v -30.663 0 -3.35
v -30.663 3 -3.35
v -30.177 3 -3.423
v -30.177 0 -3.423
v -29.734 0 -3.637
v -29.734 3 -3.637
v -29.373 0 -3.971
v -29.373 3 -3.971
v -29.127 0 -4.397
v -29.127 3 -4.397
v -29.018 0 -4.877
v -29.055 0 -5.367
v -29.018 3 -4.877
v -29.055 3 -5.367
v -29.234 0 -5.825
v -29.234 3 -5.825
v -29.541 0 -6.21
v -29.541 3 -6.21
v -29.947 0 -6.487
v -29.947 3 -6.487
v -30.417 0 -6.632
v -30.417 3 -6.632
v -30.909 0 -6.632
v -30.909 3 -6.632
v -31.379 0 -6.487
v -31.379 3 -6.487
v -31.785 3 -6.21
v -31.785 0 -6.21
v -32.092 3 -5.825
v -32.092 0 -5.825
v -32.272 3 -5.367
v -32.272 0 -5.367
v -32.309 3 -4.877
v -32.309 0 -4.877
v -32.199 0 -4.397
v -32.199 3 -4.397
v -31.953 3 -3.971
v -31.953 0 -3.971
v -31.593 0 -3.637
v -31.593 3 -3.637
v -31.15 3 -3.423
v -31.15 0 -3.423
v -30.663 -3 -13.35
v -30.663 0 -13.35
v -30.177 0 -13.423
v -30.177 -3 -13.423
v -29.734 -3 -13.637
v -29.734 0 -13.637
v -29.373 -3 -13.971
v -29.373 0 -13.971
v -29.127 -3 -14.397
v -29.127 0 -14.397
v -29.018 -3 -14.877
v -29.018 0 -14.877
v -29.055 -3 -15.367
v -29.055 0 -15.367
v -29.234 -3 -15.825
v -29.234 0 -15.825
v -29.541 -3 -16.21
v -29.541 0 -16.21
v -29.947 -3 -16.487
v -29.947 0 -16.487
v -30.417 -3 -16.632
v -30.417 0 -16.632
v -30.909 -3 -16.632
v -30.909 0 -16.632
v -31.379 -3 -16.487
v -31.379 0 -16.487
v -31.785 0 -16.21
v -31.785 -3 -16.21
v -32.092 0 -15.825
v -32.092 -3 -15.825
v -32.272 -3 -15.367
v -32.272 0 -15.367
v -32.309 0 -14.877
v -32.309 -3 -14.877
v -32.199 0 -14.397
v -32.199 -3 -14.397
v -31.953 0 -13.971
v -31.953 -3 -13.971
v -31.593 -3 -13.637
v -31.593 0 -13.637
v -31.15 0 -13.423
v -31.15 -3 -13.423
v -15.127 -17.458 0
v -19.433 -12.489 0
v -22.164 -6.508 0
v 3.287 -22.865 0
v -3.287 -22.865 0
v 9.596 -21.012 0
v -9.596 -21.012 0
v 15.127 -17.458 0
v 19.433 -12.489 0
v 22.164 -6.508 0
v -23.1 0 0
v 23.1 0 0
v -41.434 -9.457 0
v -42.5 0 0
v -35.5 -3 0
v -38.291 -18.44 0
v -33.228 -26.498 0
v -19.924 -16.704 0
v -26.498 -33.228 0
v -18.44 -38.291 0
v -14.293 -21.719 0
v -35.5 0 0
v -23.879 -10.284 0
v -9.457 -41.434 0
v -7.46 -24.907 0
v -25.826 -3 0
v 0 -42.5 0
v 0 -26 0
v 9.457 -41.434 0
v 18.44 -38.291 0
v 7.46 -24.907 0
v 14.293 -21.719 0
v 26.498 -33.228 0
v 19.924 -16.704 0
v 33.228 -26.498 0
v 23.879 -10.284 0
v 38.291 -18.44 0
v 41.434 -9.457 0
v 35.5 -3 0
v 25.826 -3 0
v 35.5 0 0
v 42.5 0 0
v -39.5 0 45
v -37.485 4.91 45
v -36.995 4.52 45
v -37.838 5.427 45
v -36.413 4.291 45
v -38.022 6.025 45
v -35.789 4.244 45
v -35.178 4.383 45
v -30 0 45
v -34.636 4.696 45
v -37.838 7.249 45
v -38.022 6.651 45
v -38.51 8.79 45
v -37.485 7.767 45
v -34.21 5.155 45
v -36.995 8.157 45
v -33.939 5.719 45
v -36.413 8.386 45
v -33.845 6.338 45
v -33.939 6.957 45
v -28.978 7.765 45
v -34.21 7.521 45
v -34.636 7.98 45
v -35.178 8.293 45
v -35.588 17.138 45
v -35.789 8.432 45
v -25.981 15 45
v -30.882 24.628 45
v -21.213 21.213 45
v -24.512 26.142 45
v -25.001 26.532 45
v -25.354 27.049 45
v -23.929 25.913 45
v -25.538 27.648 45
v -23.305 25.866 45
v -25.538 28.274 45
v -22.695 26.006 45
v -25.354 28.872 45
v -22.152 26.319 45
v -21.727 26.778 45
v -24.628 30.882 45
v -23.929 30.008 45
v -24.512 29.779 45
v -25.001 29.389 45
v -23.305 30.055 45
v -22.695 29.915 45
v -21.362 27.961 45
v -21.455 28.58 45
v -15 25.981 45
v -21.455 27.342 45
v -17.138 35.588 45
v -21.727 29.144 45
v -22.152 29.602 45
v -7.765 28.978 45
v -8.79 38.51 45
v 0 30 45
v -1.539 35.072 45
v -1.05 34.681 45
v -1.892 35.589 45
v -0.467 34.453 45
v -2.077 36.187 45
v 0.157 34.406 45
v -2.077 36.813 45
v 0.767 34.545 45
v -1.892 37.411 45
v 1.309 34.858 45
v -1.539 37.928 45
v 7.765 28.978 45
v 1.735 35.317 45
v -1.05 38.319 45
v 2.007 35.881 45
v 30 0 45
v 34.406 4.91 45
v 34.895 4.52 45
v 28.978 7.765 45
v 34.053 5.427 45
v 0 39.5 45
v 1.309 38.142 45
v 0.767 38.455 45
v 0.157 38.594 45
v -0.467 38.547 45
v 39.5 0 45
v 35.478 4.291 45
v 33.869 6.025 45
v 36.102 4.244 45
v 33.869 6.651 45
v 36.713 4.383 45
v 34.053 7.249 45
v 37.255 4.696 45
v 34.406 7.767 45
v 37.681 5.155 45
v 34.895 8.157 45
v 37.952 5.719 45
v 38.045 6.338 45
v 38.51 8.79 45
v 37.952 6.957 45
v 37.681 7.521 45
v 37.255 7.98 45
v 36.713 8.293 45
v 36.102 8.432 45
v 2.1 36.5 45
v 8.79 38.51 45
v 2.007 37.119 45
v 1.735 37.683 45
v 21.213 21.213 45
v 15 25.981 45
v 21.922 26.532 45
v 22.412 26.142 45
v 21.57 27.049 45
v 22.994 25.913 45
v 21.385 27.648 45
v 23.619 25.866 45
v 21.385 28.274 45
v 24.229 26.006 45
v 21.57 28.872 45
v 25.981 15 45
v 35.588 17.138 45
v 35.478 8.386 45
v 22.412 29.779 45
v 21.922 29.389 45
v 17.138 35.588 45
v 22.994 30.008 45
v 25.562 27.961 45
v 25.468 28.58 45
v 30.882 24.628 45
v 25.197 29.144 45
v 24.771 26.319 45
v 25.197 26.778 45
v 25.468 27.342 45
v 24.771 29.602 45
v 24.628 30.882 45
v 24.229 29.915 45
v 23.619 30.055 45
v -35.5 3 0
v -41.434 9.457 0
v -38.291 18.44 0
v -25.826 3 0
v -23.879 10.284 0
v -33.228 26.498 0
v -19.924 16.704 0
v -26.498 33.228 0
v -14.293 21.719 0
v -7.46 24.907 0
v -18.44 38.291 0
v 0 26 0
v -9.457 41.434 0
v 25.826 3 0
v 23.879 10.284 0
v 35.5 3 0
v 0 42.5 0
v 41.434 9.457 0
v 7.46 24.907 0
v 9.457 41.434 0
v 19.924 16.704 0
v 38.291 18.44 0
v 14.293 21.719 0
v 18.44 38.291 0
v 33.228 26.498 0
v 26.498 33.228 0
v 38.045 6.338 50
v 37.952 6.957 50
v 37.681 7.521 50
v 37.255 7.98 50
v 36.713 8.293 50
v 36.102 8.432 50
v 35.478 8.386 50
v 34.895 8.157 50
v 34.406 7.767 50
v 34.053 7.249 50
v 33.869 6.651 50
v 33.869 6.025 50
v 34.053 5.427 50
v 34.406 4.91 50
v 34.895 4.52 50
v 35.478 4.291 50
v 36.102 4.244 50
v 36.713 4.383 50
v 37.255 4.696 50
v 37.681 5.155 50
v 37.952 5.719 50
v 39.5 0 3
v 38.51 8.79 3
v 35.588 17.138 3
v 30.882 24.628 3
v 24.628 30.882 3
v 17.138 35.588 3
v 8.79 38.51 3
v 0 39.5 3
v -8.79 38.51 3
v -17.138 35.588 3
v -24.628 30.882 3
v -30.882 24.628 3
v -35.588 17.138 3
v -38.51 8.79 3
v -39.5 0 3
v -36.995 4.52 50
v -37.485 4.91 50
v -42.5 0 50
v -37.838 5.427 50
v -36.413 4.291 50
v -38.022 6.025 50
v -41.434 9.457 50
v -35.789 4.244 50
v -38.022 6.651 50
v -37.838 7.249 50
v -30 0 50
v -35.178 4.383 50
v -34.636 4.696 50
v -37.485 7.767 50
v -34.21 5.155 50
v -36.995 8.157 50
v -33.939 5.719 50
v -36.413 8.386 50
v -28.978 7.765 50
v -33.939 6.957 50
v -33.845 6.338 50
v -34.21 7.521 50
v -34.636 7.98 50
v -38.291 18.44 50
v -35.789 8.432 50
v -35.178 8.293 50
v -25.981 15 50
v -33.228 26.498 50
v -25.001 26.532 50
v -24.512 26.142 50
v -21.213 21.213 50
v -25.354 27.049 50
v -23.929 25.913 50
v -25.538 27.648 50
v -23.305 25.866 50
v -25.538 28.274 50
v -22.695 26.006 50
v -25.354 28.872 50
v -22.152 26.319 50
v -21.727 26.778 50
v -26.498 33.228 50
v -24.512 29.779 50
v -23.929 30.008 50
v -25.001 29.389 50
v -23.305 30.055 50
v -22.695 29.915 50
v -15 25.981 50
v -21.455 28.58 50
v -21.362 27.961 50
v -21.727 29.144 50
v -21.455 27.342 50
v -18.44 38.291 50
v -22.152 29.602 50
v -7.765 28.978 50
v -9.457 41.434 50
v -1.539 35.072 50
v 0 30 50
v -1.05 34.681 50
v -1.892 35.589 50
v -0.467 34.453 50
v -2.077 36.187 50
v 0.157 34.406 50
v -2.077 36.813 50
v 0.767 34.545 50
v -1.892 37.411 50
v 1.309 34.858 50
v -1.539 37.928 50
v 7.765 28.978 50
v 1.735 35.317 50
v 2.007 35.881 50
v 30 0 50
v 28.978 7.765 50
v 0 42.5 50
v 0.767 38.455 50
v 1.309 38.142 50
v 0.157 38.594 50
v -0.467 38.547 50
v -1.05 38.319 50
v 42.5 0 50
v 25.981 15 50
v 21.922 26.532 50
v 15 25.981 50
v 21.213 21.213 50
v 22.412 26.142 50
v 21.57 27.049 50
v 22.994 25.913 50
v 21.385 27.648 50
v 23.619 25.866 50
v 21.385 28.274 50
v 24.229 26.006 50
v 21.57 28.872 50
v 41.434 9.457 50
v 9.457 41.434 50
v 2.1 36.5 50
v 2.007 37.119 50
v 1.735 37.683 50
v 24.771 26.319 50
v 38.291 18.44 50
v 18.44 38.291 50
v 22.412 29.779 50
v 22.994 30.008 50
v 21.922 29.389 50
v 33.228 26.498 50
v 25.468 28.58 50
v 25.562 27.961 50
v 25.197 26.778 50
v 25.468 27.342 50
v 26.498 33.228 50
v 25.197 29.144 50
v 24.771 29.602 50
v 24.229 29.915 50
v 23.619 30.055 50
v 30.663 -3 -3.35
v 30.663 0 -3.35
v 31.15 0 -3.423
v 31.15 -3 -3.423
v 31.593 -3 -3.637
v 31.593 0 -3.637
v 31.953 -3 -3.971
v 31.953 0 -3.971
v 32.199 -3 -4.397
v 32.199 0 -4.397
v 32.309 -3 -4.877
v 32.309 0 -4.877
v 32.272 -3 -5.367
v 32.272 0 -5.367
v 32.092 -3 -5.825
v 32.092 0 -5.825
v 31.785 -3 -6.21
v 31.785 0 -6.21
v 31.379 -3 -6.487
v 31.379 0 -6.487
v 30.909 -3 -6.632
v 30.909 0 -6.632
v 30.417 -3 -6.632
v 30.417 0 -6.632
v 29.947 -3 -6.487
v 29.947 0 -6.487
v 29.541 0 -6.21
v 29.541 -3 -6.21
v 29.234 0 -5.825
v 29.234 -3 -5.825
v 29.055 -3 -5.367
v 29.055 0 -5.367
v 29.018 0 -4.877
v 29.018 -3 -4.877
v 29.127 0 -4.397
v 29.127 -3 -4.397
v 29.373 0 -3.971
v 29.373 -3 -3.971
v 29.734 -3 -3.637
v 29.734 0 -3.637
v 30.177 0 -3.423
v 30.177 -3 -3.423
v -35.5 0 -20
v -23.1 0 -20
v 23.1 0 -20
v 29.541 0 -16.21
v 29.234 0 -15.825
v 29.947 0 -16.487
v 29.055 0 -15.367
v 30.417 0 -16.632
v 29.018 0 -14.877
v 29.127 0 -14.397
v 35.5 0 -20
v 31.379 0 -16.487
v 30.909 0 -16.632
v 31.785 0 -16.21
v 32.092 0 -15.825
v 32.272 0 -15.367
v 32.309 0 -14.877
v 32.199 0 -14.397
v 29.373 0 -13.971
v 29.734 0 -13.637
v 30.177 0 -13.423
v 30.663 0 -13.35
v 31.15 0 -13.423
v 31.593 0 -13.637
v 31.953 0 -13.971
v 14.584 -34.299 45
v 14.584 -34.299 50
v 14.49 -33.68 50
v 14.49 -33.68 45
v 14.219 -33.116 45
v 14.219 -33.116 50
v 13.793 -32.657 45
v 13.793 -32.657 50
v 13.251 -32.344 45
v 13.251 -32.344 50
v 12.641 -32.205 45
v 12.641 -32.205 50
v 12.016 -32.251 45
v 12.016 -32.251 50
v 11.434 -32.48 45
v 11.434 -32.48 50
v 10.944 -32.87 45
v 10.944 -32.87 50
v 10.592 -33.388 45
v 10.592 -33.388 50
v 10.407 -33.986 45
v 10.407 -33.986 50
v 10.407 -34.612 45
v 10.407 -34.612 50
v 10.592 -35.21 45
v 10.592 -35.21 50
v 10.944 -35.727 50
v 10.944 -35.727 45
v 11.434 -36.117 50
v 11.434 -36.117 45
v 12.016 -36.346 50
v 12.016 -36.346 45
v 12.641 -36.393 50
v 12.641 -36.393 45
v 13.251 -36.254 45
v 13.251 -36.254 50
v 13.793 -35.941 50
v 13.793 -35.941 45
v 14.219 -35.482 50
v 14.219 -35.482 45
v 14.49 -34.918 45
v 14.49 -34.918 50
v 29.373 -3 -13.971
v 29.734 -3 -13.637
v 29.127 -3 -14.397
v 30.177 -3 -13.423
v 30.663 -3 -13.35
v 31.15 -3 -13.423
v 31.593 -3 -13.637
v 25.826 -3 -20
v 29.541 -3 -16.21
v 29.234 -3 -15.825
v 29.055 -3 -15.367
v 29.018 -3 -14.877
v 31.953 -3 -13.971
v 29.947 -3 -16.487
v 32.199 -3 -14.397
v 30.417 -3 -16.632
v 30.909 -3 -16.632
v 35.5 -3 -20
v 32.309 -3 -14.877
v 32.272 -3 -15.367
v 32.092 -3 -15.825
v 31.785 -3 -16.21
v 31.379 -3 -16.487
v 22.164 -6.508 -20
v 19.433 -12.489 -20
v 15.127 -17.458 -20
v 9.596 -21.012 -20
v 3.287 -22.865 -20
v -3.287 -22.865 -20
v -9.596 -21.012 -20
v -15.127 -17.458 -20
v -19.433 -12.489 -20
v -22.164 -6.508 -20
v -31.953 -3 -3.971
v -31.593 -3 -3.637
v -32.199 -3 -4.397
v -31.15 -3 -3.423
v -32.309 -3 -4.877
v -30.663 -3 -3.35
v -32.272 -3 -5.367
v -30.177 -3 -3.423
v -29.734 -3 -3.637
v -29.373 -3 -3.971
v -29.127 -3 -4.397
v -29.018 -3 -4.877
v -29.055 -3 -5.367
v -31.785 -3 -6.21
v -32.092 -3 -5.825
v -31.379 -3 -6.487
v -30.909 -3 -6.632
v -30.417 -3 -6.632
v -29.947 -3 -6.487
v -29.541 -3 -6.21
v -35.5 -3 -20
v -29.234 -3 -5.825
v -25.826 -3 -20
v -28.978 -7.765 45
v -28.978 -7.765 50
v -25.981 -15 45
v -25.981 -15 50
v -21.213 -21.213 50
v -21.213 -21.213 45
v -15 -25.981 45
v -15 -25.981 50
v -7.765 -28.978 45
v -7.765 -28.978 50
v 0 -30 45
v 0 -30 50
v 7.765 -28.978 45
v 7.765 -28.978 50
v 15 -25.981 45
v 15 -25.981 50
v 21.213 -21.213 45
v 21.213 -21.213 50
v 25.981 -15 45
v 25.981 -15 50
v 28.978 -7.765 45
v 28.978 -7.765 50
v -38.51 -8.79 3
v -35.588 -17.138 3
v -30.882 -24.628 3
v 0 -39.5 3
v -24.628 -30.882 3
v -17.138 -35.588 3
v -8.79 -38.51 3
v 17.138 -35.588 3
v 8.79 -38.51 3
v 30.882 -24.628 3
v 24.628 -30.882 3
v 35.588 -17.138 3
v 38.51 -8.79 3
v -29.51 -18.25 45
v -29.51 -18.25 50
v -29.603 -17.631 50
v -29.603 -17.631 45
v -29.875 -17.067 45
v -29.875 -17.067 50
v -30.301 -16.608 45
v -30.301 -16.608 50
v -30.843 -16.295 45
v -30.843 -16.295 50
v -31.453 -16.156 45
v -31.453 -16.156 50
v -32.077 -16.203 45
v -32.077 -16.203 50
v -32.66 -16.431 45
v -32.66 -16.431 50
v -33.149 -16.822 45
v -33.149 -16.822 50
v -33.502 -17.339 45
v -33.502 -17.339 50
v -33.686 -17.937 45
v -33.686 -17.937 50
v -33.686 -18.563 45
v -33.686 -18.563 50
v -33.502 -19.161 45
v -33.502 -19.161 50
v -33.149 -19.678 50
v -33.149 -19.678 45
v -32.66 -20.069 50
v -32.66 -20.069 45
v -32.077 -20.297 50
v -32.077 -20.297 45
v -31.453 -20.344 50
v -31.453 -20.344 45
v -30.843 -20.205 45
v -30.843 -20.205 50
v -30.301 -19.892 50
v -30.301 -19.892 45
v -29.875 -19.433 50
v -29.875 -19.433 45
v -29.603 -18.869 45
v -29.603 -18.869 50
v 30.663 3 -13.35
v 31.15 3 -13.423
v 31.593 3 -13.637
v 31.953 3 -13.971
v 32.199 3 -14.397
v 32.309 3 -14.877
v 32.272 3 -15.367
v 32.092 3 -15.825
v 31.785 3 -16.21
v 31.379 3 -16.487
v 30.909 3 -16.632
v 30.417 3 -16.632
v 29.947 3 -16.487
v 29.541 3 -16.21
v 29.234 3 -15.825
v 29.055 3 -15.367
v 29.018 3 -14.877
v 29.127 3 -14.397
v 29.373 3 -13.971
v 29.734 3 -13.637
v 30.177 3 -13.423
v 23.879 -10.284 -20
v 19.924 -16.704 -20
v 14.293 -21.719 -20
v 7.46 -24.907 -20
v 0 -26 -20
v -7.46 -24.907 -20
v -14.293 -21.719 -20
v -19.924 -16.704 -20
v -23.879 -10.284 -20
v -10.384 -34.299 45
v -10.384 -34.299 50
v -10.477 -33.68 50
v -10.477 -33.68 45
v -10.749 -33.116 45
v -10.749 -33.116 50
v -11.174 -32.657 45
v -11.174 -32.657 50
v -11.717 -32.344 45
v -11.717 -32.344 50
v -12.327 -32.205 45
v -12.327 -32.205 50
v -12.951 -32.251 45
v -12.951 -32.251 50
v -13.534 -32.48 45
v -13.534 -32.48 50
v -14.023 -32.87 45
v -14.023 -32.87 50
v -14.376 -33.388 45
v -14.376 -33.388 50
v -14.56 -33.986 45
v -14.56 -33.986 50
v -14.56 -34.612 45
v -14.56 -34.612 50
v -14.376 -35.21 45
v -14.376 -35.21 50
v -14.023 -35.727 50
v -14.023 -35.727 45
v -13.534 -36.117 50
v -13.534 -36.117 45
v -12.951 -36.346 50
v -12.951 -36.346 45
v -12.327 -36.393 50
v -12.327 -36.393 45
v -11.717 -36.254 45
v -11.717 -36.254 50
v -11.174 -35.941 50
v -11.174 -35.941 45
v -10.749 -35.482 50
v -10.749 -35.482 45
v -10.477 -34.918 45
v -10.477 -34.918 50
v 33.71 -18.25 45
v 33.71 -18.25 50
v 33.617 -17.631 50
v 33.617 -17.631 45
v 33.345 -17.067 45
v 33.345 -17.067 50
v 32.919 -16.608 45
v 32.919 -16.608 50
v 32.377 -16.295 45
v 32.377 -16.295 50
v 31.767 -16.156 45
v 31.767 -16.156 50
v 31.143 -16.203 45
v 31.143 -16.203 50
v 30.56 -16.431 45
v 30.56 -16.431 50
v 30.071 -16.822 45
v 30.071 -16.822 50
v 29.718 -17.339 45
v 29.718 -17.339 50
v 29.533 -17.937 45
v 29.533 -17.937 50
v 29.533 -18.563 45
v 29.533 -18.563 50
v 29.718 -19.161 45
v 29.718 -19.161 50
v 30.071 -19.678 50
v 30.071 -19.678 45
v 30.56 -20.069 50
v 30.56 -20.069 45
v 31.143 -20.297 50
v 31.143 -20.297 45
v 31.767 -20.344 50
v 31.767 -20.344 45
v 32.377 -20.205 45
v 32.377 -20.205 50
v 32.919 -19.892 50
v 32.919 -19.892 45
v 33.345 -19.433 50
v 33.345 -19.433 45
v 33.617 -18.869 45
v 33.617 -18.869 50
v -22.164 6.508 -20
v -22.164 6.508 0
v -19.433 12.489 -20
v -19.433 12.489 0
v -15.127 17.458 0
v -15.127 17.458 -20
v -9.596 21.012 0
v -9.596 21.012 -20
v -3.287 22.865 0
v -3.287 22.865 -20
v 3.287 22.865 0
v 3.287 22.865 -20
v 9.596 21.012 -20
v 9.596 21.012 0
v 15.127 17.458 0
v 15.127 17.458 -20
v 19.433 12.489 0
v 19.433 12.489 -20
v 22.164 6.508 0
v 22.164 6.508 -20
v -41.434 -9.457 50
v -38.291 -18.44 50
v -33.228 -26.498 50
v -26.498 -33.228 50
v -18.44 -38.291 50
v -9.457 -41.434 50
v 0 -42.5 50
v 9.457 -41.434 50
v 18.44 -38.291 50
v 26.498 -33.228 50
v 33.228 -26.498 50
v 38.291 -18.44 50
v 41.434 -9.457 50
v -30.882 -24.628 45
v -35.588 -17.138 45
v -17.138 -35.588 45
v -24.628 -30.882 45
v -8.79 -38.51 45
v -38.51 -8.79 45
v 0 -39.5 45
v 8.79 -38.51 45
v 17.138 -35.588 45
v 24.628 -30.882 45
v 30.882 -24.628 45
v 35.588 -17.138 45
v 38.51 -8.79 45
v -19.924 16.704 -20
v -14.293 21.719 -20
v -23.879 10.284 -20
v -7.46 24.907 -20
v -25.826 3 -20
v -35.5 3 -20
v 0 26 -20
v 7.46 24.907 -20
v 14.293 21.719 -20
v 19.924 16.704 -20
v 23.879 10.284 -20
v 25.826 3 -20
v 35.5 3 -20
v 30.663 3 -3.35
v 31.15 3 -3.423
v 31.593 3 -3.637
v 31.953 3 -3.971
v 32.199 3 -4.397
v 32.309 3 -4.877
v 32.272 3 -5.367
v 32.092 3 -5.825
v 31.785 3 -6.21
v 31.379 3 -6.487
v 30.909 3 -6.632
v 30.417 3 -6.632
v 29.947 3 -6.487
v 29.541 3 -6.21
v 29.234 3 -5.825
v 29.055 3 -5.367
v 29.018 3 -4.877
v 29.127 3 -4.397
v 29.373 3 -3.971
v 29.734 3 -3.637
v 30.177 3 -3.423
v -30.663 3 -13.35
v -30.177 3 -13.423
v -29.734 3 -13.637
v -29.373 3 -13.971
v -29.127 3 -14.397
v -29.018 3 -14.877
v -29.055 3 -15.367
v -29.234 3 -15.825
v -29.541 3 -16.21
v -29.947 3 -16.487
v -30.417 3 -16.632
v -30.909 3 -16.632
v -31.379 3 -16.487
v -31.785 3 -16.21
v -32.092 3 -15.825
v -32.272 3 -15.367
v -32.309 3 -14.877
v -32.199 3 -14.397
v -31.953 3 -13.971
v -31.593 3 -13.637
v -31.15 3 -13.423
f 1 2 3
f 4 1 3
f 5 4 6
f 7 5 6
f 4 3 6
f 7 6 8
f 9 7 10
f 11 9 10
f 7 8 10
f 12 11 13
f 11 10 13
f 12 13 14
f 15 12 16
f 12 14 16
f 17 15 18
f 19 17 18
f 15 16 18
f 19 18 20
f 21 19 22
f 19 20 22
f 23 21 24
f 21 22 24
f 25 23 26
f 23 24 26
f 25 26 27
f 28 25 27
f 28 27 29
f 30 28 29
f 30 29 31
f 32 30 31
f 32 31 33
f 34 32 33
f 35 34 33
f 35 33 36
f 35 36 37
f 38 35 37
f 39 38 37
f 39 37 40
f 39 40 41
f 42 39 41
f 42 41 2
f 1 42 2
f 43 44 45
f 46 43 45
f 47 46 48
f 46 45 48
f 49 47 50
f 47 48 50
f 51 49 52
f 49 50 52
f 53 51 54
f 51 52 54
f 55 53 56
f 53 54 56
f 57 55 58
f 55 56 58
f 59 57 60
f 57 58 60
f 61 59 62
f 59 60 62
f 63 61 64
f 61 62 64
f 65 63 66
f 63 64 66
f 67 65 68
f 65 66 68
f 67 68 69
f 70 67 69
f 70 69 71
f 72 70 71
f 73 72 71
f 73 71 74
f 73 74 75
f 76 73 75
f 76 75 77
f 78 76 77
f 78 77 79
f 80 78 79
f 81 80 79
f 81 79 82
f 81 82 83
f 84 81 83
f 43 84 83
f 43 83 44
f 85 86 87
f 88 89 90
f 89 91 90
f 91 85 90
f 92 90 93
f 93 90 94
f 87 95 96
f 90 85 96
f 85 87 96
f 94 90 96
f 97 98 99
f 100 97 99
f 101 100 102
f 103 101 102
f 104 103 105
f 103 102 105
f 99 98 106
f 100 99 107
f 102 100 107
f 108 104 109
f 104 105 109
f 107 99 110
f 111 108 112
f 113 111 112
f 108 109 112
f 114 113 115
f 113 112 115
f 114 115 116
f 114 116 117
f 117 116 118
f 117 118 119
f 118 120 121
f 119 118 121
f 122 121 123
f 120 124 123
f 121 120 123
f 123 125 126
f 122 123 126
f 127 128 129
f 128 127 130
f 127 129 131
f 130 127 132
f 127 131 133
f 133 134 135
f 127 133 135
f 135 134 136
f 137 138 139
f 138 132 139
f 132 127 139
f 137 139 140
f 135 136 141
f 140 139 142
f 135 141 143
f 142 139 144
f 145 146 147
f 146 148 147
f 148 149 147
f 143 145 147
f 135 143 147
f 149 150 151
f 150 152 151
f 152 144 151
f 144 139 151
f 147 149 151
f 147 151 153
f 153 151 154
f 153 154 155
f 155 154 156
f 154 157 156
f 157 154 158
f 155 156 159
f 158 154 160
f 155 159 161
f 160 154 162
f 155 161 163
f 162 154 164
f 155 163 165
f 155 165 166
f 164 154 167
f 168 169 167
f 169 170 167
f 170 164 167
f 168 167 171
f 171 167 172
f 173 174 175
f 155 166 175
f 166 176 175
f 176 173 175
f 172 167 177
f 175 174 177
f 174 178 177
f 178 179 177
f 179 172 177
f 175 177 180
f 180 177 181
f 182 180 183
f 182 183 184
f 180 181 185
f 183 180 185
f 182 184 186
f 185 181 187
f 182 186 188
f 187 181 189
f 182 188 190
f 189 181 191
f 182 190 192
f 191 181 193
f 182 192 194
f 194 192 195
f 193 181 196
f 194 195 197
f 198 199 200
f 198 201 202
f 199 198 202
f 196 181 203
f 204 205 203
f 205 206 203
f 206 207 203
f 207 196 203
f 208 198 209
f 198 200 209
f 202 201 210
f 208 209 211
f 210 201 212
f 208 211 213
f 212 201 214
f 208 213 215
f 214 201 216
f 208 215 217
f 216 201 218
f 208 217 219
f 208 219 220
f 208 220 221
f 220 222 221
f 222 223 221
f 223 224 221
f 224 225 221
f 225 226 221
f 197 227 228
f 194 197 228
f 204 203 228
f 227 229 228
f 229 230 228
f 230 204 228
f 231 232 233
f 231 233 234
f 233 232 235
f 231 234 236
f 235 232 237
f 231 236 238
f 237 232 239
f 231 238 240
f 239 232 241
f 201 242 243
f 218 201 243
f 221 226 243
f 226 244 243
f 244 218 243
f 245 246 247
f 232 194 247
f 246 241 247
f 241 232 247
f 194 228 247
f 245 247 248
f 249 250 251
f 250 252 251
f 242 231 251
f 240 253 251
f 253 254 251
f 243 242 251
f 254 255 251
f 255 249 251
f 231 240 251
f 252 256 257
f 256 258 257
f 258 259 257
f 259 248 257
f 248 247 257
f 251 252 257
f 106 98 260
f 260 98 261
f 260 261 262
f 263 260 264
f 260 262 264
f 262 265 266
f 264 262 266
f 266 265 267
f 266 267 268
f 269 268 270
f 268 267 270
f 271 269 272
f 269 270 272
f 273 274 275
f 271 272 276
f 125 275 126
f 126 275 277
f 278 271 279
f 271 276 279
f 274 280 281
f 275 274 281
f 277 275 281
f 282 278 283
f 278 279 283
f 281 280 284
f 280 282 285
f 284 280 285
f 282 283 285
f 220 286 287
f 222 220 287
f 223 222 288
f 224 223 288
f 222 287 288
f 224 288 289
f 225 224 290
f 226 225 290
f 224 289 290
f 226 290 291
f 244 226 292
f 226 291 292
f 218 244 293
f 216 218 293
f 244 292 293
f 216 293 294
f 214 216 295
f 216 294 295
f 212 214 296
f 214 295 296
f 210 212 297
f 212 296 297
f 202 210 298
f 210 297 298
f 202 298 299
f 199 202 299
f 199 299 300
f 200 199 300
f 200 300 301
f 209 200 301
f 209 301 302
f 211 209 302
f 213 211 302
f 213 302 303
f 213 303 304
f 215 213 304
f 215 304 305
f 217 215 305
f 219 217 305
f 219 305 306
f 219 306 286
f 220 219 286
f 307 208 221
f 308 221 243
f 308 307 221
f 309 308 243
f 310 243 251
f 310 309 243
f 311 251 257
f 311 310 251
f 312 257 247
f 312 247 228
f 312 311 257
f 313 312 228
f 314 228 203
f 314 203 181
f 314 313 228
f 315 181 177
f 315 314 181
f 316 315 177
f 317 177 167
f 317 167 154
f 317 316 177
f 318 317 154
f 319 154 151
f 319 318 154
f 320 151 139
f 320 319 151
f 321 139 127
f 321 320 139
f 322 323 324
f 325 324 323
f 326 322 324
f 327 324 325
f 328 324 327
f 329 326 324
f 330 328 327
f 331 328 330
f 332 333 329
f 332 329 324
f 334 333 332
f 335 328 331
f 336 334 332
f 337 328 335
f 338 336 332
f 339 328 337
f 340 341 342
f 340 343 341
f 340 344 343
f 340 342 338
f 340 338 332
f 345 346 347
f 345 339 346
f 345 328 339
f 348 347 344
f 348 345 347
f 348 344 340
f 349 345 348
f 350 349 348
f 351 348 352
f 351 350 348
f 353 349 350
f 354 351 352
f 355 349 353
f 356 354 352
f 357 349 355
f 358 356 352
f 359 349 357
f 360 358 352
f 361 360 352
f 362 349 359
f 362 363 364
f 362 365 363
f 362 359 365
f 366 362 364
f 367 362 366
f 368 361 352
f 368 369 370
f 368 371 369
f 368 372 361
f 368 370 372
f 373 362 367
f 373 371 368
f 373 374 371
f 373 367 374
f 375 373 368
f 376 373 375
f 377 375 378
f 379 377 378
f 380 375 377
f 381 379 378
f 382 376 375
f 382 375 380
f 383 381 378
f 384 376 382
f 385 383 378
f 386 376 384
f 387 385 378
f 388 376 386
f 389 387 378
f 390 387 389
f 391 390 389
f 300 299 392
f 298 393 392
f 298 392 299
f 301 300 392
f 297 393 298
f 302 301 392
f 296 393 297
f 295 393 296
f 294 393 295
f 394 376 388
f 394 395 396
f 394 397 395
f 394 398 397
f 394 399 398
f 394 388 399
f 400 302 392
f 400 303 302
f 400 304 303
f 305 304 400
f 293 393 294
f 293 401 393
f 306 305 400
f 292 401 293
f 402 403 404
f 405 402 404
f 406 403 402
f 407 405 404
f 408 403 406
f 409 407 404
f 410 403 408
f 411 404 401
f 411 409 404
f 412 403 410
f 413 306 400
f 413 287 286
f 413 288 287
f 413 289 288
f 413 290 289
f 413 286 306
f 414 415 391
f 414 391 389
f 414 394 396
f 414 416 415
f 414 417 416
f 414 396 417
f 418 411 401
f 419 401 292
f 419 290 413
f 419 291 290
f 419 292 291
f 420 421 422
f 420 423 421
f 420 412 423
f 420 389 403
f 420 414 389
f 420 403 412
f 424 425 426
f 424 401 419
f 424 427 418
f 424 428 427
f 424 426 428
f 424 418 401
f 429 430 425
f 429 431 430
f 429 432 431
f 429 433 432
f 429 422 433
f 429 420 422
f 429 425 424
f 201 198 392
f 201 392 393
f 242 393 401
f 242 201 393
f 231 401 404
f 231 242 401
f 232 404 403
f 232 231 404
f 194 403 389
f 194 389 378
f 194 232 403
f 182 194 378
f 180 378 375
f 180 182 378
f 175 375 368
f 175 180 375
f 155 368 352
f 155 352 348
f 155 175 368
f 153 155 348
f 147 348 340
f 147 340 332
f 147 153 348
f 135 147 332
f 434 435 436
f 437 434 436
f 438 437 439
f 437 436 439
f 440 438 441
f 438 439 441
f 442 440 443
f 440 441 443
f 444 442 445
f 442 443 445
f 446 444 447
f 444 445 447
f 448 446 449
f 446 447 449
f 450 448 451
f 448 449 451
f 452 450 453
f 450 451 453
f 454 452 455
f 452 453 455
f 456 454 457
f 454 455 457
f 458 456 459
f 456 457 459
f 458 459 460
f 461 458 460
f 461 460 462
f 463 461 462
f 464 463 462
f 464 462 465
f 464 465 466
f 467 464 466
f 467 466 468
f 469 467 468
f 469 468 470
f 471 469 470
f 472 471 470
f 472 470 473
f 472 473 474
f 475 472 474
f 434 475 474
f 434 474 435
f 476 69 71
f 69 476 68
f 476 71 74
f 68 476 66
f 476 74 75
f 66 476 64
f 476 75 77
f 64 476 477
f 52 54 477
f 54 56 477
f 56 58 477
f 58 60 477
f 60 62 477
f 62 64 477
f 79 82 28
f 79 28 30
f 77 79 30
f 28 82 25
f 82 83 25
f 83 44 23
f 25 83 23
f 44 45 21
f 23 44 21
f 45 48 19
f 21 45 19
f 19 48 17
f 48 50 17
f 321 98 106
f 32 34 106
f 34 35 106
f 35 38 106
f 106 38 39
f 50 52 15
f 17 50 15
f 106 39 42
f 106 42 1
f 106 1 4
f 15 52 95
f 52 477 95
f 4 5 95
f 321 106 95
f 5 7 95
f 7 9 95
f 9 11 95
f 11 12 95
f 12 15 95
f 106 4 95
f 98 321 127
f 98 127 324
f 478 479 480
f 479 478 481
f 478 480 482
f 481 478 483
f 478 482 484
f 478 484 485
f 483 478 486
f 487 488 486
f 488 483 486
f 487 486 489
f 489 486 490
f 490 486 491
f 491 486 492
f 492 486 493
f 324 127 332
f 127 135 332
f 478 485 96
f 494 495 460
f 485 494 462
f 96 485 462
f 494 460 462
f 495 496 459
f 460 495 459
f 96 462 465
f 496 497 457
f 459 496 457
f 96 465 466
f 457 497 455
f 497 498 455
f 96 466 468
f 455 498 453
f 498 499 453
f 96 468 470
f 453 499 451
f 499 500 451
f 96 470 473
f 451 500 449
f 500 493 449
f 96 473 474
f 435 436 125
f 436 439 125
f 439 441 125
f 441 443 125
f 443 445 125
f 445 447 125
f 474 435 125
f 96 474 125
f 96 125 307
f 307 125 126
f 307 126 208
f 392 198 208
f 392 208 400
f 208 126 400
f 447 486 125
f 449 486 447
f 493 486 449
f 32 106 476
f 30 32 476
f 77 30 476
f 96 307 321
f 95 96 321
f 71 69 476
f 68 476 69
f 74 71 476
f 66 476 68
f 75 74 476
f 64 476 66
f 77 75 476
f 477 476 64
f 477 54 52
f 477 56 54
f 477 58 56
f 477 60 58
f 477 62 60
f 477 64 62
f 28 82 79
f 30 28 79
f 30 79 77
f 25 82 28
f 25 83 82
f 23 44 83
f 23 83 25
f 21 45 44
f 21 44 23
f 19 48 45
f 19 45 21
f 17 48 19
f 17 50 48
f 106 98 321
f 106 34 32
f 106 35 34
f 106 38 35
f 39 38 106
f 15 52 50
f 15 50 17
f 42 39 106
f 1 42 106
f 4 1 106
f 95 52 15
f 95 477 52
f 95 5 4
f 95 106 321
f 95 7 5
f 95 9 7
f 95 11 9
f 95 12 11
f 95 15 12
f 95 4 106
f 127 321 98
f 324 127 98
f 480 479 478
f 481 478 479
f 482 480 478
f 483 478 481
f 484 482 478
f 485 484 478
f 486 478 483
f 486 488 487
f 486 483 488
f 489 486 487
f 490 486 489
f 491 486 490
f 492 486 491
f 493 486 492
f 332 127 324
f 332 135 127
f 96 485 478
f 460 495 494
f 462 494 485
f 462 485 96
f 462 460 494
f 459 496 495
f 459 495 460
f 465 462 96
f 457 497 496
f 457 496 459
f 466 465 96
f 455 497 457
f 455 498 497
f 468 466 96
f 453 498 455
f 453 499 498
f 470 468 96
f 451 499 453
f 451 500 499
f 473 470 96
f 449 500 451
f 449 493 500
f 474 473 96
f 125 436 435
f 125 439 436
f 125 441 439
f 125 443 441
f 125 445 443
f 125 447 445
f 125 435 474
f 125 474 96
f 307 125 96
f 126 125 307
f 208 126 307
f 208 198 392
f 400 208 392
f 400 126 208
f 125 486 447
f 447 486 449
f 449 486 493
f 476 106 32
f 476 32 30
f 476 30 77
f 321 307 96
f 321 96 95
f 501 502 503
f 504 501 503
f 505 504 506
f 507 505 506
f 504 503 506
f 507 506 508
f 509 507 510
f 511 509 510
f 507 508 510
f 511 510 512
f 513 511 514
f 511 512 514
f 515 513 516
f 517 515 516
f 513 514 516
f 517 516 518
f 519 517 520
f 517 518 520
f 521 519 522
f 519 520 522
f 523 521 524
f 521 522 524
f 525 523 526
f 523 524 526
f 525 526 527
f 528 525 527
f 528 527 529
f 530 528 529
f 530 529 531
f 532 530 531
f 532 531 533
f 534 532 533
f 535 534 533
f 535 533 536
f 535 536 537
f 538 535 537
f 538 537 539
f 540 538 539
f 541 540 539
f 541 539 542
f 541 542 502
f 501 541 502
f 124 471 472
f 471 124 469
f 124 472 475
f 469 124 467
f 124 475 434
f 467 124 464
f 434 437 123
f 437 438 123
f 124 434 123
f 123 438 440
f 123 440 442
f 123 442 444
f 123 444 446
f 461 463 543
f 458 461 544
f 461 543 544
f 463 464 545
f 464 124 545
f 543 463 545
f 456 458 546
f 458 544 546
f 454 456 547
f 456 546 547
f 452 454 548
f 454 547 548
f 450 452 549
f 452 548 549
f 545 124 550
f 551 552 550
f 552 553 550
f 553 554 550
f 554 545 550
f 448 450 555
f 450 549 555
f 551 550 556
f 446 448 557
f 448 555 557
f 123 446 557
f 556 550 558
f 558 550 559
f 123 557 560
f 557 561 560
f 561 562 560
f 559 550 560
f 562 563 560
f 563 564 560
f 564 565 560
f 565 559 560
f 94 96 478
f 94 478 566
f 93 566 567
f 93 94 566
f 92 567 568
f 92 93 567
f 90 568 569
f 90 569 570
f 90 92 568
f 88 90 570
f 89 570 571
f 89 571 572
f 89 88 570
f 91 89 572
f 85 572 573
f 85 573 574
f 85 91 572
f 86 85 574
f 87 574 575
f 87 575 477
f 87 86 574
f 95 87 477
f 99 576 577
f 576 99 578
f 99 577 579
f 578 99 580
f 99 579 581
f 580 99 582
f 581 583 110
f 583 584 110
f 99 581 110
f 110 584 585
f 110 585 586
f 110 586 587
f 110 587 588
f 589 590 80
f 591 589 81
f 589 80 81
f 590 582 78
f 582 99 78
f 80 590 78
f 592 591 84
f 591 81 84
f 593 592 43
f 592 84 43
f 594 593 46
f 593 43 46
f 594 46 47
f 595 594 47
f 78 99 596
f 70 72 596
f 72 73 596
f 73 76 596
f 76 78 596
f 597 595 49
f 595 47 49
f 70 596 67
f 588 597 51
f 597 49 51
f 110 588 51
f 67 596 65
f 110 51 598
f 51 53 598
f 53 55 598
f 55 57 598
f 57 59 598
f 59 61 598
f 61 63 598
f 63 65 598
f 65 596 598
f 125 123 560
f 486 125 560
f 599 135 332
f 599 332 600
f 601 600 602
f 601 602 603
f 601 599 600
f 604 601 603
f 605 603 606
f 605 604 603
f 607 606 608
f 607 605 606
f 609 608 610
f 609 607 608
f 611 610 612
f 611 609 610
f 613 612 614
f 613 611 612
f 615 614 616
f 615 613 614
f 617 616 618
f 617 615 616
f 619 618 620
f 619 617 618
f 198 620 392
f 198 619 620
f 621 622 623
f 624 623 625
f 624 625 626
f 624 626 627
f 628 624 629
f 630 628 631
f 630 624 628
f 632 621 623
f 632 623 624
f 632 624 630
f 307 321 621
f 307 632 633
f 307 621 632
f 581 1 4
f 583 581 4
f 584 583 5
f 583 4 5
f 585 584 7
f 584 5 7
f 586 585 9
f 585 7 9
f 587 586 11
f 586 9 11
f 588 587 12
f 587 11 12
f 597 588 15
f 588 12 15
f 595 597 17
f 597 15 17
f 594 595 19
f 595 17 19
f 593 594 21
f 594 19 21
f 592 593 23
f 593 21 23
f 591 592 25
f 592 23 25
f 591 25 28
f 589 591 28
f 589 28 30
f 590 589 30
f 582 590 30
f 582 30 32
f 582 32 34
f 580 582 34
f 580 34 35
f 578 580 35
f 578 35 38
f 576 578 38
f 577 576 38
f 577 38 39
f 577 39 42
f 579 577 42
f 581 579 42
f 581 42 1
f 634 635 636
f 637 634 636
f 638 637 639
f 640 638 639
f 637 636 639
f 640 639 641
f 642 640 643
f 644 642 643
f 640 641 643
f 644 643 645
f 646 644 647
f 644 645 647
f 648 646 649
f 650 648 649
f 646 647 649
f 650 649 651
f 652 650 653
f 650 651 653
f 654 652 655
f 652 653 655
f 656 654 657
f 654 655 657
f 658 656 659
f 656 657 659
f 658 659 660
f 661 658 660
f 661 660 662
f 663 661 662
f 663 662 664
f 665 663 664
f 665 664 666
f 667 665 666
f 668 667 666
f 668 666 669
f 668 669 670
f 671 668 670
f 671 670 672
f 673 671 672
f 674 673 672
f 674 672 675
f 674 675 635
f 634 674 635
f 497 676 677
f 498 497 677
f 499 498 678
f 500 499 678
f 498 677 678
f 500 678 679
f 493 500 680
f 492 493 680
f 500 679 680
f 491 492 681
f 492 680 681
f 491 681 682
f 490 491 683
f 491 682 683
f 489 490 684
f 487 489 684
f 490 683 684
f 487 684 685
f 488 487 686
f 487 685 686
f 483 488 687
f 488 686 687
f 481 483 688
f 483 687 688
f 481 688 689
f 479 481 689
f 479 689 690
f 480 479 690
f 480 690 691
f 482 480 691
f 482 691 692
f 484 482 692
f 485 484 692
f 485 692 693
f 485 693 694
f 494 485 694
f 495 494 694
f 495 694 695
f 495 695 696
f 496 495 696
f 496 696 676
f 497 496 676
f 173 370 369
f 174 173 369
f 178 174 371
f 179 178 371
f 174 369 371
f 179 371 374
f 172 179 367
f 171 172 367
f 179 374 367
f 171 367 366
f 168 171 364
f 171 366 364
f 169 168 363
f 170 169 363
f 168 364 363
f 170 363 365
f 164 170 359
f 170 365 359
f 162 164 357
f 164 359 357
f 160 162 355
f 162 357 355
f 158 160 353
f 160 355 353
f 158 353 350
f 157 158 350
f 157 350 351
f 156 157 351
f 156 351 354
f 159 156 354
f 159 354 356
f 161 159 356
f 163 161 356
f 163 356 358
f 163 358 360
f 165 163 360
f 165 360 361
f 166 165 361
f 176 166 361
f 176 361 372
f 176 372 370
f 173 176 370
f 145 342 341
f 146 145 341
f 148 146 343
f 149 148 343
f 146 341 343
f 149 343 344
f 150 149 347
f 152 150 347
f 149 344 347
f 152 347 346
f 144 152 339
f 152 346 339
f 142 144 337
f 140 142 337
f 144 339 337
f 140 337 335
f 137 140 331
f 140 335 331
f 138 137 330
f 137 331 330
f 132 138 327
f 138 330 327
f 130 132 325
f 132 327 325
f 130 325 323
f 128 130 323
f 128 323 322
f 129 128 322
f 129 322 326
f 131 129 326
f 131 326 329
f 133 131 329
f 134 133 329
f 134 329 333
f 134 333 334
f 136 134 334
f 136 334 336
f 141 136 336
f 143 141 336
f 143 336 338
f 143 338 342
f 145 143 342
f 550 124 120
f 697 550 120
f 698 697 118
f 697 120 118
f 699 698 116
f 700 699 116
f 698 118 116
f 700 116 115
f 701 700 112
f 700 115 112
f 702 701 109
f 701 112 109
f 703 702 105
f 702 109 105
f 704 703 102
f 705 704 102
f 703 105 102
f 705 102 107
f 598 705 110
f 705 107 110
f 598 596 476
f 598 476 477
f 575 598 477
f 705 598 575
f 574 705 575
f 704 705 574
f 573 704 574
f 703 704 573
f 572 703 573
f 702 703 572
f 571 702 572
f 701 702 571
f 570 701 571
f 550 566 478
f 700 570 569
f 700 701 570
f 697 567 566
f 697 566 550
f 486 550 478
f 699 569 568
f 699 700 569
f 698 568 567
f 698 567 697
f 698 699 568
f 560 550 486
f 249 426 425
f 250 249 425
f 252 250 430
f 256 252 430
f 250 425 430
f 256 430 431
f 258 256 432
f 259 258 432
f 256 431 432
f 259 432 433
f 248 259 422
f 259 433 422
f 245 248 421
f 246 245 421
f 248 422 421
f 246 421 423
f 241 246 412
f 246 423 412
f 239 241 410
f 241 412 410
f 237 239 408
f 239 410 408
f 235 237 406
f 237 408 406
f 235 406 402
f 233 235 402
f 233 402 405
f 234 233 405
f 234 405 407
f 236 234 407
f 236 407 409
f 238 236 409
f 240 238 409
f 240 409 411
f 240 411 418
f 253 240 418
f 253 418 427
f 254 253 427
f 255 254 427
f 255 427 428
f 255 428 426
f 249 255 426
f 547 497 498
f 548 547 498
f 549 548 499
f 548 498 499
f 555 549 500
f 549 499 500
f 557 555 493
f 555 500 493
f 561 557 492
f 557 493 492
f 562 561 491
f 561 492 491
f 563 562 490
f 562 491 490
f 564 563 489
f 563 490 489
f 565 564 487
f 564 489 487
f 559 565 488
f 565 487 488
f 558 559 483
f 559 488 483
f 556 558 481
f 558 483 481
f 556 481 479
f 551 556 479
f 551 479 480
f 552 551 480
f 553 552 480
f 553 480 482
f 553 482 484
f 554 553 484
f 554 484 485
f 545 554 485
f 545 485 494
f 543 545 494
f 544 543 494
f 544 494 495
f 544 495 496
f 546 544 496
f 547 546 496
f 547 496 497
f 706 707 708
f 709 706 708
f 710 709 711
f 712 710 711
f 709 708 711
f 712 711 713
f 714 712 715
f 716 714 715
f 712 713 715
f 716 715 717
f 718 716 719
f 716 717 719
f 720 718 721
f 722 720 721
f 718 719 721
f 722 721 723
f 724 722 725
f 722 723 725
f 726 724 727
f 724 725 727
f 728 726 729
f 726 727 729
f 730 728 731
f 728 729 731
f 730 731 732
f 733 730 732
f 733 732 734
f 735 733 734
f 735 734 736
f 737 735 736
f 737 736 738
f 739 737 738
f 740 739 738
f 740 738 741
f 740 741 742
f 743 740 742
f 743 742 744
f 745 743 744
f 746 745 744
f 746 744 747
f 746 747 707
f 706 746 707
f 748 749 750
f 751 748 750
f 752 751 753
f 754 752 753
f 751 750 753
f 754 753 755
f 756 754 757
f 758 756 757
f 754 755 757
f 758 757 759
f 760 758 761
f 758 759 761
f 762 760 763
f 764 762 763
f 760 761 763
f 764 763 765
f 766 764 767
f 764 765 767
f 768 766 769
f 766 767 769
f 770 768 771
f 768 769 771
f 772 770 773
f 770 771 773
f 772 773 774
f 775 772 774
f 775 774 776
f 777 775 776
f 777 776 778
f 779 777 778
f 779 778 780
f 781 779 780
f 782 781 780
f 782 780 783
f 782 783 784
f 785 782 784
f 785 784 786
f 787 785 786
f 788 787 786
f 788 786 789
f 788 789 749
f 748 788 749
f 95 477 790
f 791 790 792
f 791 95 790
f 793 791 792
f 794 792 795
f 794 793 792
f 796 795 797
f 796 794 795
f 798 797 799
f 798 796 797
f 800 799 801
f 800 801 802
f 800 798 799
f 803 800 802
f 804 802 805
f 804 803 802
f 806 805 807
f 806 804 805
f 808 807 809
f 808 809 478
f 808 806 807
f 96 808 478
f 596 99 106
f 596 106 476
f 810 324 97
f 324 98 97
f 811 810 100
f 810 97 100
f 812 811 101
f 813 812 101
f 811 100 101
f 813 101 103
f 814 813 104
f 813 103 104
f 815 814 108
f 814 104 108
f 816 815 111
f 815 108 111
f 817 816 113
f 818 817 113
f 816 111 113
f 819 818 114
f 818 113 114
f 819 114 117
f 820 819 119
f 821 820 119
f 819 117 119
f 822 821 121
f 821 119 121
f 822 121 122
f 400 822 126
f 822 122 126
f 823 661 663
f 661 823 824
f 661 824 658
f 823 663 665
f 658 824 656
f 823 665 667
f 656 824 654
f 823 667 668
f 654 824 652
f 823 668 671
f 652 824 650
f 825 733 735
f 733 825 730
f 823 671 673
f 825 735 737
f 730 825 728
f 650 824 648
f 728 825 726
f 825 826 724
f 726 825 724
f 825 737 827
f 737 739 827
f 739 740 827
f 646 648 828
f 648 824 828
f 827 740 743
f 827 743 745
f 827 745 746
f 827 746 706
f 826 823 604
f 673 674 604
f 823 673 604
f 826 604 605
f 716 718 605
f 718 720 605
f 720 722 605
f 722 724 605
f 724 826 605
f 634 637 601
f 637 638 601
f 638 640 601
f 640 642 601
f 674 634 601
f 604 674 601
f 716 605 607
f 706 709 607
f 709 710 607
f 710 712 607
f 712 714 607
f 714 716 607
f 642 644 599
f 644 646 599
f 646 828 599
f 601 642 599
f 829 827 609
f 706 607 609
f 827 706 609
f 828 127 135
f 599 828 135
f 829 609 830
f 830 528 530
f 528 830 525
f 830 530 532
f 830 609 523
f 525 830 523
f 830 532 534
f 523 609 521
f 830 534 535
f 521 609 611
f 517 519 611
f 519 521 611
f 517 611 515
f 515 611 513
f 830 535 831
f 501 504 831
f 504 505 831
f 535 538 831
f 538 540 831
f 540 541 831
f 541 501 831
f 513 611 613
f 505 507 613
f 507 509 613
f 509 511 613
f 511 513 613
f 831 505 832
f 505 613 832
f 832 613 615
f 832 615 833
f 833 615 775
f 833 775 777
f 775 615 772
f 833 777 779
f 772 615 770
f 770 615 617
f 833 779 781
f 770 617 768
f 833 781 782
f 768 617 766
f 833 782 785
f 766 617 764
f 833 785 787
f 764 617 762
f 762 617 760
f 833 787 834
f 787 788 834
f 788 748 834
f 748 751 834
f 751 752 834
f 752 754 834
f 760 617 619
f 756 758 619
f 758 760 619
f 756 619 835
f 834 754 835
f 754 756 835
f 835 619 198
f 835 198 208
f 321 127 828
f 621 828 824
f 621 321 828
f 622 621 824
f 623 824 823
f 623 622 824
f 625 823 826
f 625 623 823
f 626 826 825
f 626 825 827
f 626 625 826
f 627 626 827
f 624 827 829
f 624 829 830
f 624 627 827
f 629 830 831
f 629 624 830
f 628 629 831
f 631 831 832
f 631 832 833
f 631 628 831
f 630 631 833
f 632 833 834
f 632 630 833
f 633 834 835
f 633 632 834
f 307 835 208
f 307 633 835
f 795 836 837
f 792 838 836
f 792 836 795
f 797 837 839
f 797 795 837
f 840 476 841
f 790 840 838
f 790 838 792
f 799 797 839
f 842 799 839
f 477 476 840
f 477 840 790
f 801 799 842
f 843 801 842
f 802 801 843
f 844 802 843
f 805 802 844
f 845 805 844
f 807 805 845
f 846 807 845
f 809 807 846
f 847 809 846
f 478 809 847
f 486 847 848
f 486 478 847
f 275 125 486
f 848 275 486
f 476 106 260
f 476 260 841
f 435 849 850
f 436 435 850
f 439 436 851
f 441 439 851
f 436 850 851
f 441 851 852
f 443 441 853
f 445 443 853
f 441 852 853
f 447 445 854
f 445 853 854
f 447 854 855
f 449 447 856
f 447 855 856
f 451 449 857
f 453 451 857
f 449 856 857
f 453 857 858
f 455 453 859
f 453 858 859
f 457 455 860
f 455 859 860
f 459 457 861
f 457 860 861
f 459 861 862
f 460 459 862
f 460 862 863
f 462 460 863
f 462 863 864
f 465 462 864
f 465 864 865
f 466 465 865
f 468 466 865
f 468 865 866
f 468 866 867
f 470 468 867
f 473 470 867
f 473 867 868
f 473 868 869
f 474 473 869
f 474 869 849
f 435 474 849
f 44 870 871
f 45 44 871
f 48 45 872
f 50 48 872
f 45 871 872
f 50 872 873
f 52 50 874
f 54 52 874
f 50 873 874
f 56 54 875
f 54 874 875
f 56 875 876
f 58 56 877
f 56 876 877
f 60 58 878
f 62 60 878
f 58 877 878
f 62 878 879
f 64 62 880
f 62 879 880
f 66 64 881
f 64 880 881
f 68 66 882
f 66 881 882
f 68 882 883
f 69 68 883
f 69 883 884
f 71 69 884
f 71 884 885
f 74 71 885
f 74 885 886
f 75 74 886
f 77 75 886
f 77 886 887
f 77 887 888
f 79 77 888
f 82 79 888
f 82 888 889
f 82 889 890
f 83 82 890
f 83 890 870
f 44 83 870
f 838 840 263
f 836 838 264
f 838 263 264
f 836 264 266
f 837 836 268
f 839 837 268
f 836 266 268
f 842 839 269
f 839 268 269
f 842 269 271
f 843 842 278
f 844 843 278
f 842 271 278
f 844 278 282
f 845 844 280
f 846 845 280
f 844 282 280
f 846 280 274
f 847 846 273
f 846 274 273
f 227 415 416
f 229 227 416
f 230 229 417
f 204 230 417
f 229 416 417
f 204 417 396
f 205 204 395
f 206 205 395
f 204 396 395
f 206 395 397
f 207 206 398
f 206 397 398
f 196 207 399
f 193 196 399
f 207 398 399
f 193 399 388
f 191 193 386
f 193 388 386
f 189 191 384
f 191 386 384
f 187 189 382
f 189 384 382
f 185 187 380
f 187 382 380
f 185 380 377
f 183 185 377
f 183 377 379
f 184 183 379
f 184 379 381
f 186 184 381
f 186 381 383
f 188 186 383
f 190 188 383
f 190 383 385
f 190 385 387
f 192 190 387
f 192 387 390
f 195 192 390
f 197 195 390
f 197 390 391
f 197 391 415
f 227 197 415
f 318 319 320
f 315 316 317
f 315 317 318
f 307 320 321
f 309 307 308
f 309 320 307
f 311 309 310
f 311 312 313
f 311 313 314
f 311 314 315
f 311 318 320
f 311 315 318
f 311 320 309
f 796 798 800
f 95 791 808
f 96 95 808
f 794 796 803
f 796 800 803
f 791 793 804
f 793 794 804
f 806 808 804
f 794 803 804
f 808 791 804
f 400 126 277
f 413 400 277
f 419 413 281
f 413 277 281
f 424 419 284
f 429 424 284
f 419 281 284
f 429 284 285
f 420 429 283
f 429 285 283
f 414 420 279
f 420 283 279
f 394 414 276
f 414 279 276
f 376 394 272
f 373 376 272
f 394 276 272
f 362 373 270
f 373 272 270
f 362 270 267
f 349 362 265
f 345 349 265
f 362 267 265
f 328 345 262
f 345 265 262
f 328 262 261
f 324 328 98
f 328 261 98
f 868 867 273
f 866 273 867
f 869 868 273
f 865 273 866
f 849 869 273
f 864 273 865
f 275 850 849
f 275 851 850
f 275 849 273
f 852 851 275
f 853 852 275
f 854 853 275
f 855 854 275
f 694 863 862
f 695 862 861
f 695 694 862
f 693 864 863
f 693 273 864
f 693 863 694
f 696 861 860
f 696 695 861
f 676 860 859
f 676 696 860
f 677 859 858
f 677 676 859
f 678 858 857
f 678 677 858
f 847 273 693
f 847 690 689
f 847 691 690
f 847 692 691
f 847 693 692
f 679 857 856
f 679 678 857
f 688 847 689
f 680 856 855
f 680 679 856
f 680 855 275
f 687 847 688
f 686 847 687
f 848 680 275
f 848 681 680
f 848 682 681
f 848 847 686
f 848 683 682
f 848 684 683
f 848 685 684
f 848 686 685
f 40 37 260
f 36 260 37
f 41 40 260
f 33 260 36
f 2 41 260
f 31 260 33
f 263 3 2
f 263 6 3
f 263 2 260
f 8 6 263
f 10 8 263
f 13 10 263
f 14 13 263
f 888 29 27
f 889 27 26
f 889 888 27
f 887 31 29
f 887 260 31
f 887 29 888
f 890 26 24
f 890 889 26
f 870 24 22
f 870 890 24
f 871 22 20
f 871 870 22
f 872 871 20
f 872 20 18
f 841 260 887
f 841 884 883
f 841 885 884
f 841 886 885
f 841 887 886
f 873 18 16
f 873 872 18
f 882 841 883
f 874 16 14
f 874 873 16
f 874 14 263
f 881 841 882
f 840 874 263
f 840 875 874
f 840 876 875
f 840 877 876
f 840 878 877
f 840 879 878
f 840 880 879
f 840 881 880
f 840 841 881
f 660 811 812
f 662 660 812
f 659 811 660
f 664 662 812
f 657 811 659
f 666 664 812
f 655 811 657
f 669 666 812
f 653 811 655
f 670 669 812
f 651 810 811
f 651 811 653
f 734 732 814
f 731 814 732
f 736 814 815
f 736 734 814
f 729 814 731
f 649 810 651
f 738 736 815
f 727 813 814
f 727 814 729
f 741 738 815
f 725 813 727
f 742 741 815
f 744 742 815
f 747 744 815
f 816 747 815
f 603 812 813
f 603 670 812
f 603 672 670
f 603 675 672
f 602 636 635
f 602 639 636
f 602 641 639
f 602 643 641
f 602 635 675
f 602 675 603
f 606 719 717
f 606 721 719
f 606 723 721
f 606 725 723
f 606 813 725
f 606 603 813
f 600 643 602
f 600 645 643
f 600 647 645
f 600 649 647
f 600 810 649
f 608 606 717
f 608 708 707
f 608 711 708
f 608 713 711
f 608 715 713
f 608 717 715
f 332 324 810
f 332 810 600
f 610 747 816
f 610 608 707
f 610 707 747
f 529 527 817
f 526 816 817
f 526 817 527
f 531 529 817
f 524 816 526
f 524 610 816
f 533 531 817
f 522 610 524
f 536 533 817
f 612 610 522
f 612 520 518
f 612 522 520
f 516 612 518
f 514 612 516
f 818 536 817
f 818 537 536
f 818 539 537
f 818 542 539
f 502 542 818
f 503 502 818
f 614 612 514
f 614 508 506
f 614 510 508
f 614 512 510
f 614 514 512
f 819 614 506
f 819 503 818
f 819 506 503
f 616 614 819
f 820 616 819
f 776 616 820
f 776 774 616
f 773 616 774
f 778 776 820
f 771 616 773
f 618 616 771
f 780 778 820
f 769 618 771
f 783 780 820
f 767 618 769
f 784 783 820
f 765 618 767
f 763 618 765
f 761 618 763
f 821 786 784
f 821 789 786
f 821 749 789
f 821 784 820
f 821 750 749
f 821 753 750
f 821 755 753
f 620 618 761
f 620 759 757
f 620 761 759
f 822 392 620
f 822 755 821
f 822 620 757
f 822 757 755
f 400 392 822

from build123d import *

# Parameters (mm, degrees)
SKETCH_1_R           = 42.5
EXTRUDE_1_DEPTH      = 3
SKETCH_2_R           = 42.5
SKETCH_2_R_2         = 39.5
EXTRUDE_2_DEPTH      = 42
SKETCH_3_R           = 42.5
SKETCH_3_R_2         = 30
EXTRUDE_3_DEPTH      = 5
CUT_EXTRUDE_1_REACH  = 80.182
SKETCH_4_R           = 2.1
SKETCH_5_R           = 26
SKETCH_5_R_2         = 23.1
EXTRUDE_4_DEPTH      = 20
EXTRUDE_5_DEPTH      = 3
EXTRUDE_5_DEPTH_BACK = 3
SKETCH_6_W           = 11
SKETCH_6_H           = 20
CUT_EXTRUDE_2_REACH  = 81.853
SKETCH_7_R           = 1.65


with BuildPart() as part:
    # ｽｹｯﾁ1 → ﾎﾞｽ - 押し出し1 (new body)
    with BuildSketch(Plane.XY):
        Circle(SKETCH_1_R)
    extrude(amount=EXTRUDE_1_DEPTH)

    # ｽｹｯﾁ2 → ﾎﾞｽ - 押し出し2 (add)
    with BuildSketch(Plane.XY.offset(3)):
        Circle(SKETCH_2_R)
        Circle(SKETCH_2_R_2, mode=Mode.SUBTRACT)
    extrude(amount=EXTRUDE_2_DEPTH)

    # ｽｹｯﾁ3 → ﾎﾞｽ - 押し出し3 (add)
    with BuildSketch(Plane.XY.offset(45)):
        Circle(SKETCH_3_R)
        Circle(SKETCH_3_R_2, mode=Mode.SUBTRACT)
    extrude(amount=EXTRUDE_3_DEPTH)

    # ｽｹｯﾁ4 → ｶｯﾄ - 押し出し1 (cut, up to next)
    with BuildSketch(Plane.XY.offset(50), mode=Mode.PRIVATE) as cut_extrude_1_sk1:
        with Locations((0, 36.5)):
            Circle(SKETCH_4_R)
    cut_extrude_1_tool1 = extrude(cut_extrude_1_sk1.sketch, amount=-CUT_EXTRUDE_1_REACH, mode=Mode.PRIVATE) & part.part
    # ｽｹｯﾁ4 → ｶｯﾄ - 押し出し1 (cut, up to next)
    with BuildSketch(Plane.XY.offset(50), mode=Mode.PRIVATE) as cut_extrude_1_sk2:
        with Locations((23.461747754, 27.960622174)):
            Circle(SKETCH_4_R)
    cut_extrude_1_tool2 = extrude(cut_extrude_1_sk2.sketch, amount=-CUT_EXTRUDE_1_REACH, mode=Mode.PRIVATE) & part.part
    # ｽｹｯﾁ4 → ｶｯﾄ - 押し出し1 (cut, up to next)
    with BuildSketch(Plane.XY.offset(50), mode=Mode.PRIVATE) as cut_extrude_1_sk3:
        with Locations((35.945482985, 6.338158485)):
            Circle(SKETCH_4_R)
    cut_extrude_1_tool3 = extrude(cut_extrude_1_sk3.sketch, amount=-CUT_EXTRUDE_1_REACH, mode=Mode.PRIVATE) & part.part
    # ｽｹｯﾁ4 → ｶｯﾄ - 押し出し1 (cut, up to next)
    with BuildSketch(Plane.XY.offset(50), mode=Mode.PRIVATE) as cut_extrude_1_sk4:
        with Locations((31.609927238, -18.25)):
            Circle(SKETCH_4_R)
    cut_extrude_1_tool4 = extrude(cut_extrude_1_sk4.sketch, amount=-CUT_EXTRUDE_1_REACH, mode=Mode.PRIVATE) & part.part
    # ｽｹｯﾁ4 → ｶｯﾄ - 押し出し1 (cut, up to next)
    with BuildSketch(Plane.XY.offset(50), mode=Mode.PRIVATE) as cut_extrude_1_sk5:
        with Locations((12.483735231, -34.298780659)):
            Circle(SKETCH_4_R)
    cut_extrude_1_tool5 = extrude(cut_extrude_1_sk5.sketch, amount=-CUT_EXTRUDE_1_REACH, mode=Mode.PRIVATE) & part.part
    # ｽｹｯﾁ4 → ｶｯﾄ - 押し出し1 (cut, up to next)
    with BuildSketch(Plane.XY.offset(50), mode=Mode.PRIVATE) as cut_extrude_1_sk6:
        with Locations((-12.483735231, -34.298780659)):
            Circle(SKETCH_4_R)
    cut_extrude_1_tool6 = extrude(cut_extrude_1_sk6.sketch, amount=-CUT_EXTRUDE_1_REACH, mode=Mode.PRIVATE) & part.part
    # ｽｹｯﾁ4 → ｶｯﾄ - 押し出し1 (cut, up to next)
    with BuildSketch(Plane.XY.offset(50), mode=Mode.PRIVATE) as cut_extrude_1_sk7:
        with Locations((-31.609927238, -18.25)):
            Circle(SKETCH_4_R)
    cut_extrude_1_tool7 = extrude(cut_extrude_1_sk7.sketch, amount=-CUT_EXTRUDE_1_REACH, mode=Mode.PRIVATE) & part.part
    # ｽｹｯﾁ4 → ｶｯﾄ - 押し出し1 (cut, up to next)
    with BuildSketch(Plane.XY.offset(50), mode=Mode.PRIVATE) as cut_extrude_1_sk8:
        with Locations((-35.945482985, 6.338158485)):
            Circle(SKETCH_4_R)
    cut_extrude_1_tool8 = extrude(cut_extrude_1_sk8.sketch, amount=-CUT_EXTRUDE_1_REACH, mode=Mode.PRIVATE) & part.part
    # ｽｹｯﾁ4 → ｶｯﾄ - 押し出し1 (cut, up to next)
    with BuildSketch(Plane.XY.offset(50), mode=Mode.PRIVATE) as cut_extrude_1_sk9:
        with Locations((-23.461747754, 27.960622174)):
            Circle(SKETCH_4_R)
    cut_extrude_1_tool9 = extrude(cut_extrude_1_sk9.sketch, amount=-CUT_EXTRUDE_1_REACH, mode=Mode.PRIVATE) & part.part
    add(cut_extrude_1_tool1.solids().sort_by_distance((0, 36.5, 50))[0], mode=Mode.SUBTRACT)
    add(cut_extrude_1_tool2.solids().sort_by_distance((23.461748, 27.960622, 50))[0], mode=Mode.SUBTRACT)
    add(cut_extrude_1_tool3.solids().sort_by_distance((35.945483, 6.338158, 50))[0], mode=Mode.SUBTRACT)
    add(cut_extrude_1_tool4.solids().sort_by_distance((31.609927, -18.25, 50))[0], mode=Mode.SUBTRACT)
    add(cut_extrude_1_tool5.solids().sort_by_distance((12.483735, -34.298781, 50))[0], mode=Mode.SUBTRACT)
    add(cut_extrude_1_tool6.solids().sort_by_distance((-12.483735, -34.298781, 50))[0], mode=Mode.SUBTRACT)
    add(cut_extrude_1_tool7.solids().sort_by_distance((-31.609927, -18.25, 50))[0], mode=Mode.SUBTRACT)
    add(cut_extrude_1_tool8.solids().sort_by_distance((-35.945483, 6.338158, 50))[0], mode=Mode.SUBTRACT)
    add(cut_extrude_1_tool9.solids().sort_by_distance((-23.461748, 27.960622, 50))[0], mode=Mode.SUBTRACT)

    # ｽｹｯﾁ5 → ﾎﾞｽ - 押し出し4 (add)
    with BuildSketch(Plane(origin=(0, 0, 0), x_dir=(-1, 0, 0), z_dir=(0, 0, -1))):
        Circle(SKETCH_5_R)
        Circle(SKETCH_5_R_2, mode=Mode.SUBTRACT)
    extrude(amount=EXTRUDE_4_DEPTH)

    # ｽｹｯﾁ6 → ﾎﾞｽ - 押し出し5 (add, two sides: drawn at the far end of the back side and taken through both)
    with BuildSketch(Plane(origin=(0, 0, 0), x_dir=(1, 0, 0), z_dir=(0, 1, 0)).offset(-EXTRUDE_5_DEPTH_BACK)):
        with Locations((-30, 10)):
            Rectangle(SKETCH_6_W, SKETCH_6_H)
        with Locations((30, 10)):
            Rectangle(SKETCH_6_W, SKETCH_6_H)
    extrude(amount=EXTRUDE_5_DEPTH + EXTRUDE_5_DEPTH_BACK)

    # ｽｹｯﾁ7 → ｶｯﾄ - 押し出し2 (cut, up to next)
    with BuildSketch(Plane(origin=(0, 3, 0), x_dir=(1, 0, 0), z_dir=(0, 1, 0)), mode=Mode.PRIVATE) as cut_extrude_2_sk1:
        with Locations((-30.66317157, 15)):
            Circle(SKETCH_7_R)
    cut_extrude_2_tool1 = extrude(cut_extrude_2_sk1.sketch, amount=-CUT_EXTRUDE_2_REACH, mode=Mode.PRIVATE) & part.part
    # ｽｹｯﾁ7 → ｶｯﾄ - 押し出し2 (cut, up to next)
    with BuildSketch(Plane(origin=(0, 3, 0), x_dir=(1, 0, 0), z_dir=(0, 1, 0)), mode=Mode.PRIVATE) as cut_extrude_2_sk2:
        with Locations((-30.66317157, 5)):
            Circle(SKETCH_7_R)
    cut_extrude_2_tool2 = extrude(cut_extrude_2_sk2.sketch, amount=-CUT_EXTRUDE_2_REACH, mode=Mode.PRIVATE) & part.part
    # ｽｹｯﾁ7 → ｶｯﾄ - 押し出し2 (cut, up to next)
    with BuildSketch(Plane(origin=(0, 3, 0), x_dir=(1, 0, 0), z_dir=(0, 1, 0)), mode=Mode.PRIVATE) as cut_extrude_2_sk3:
        with Locations((30.66317157, 5)):
            Circle(SKETCH_7_R)
    cut_extrude_2_tool3 = extrude(cut_extrude_2_sk3.sketch, amount=-CUT_EXTRUDE_2_REACH, mode=Mode.PRIVATE) & part.part
    # ｽｹｯﾁ7 → ｶｯﾄ - 押し出し2 (cut, up to next)
    with BuildSketch(Plane(origin=(0, 3, 0), x_dir=(1, 0, 0), z_dir=(0, 1, 0)), mode=Mode.PRIVATE) as cut_extrude_2_sk4:
        with Locations((30.66317157, 15)):
            Circle(SKETCH_7_R)
    cut_extrude_2_tool4 = extrude(cut_extrude_2_sk4.sketch, amount=-CUT_EXTRUDE_2_REACH, mode=Mode.PRIVATE) & part.part
    add(cut_extrude_2_tool1.solids().sort_by_distance((-30.663172, 3, -15))[0], mode=Mode.SUBTRACT)
    add(cut_extrude_2_tool2.solids().sort_by_distance((-30.663172, 3, -5))[0], mode=Mode.SUBTRACT)
    add(cut_extrude_2_tool3.solids().sort_by_distance((30.663172, 3, -5))[0], mode=Mode.SUBTRACT)
    add(cut_extrude_2_tool4.solids().sort_by_distance((30.663172, 3, -15))[0], mode=Mode.SUBTRACT)


with BuildPart() as body_2:
    # Split Bodies 1: the piece on the far side of the plane
    add(part.part)
    split(bisect_by=Plane.ZX, keep=Keep.BOTTOM)


with BuildPart() as part_1:
    add(part.part)

    # Split Bodies 1
    split(bisect_by=Plane.ZX, keep=Keep.TOP)


solid = Compound([body_2.part, part_1.part])
